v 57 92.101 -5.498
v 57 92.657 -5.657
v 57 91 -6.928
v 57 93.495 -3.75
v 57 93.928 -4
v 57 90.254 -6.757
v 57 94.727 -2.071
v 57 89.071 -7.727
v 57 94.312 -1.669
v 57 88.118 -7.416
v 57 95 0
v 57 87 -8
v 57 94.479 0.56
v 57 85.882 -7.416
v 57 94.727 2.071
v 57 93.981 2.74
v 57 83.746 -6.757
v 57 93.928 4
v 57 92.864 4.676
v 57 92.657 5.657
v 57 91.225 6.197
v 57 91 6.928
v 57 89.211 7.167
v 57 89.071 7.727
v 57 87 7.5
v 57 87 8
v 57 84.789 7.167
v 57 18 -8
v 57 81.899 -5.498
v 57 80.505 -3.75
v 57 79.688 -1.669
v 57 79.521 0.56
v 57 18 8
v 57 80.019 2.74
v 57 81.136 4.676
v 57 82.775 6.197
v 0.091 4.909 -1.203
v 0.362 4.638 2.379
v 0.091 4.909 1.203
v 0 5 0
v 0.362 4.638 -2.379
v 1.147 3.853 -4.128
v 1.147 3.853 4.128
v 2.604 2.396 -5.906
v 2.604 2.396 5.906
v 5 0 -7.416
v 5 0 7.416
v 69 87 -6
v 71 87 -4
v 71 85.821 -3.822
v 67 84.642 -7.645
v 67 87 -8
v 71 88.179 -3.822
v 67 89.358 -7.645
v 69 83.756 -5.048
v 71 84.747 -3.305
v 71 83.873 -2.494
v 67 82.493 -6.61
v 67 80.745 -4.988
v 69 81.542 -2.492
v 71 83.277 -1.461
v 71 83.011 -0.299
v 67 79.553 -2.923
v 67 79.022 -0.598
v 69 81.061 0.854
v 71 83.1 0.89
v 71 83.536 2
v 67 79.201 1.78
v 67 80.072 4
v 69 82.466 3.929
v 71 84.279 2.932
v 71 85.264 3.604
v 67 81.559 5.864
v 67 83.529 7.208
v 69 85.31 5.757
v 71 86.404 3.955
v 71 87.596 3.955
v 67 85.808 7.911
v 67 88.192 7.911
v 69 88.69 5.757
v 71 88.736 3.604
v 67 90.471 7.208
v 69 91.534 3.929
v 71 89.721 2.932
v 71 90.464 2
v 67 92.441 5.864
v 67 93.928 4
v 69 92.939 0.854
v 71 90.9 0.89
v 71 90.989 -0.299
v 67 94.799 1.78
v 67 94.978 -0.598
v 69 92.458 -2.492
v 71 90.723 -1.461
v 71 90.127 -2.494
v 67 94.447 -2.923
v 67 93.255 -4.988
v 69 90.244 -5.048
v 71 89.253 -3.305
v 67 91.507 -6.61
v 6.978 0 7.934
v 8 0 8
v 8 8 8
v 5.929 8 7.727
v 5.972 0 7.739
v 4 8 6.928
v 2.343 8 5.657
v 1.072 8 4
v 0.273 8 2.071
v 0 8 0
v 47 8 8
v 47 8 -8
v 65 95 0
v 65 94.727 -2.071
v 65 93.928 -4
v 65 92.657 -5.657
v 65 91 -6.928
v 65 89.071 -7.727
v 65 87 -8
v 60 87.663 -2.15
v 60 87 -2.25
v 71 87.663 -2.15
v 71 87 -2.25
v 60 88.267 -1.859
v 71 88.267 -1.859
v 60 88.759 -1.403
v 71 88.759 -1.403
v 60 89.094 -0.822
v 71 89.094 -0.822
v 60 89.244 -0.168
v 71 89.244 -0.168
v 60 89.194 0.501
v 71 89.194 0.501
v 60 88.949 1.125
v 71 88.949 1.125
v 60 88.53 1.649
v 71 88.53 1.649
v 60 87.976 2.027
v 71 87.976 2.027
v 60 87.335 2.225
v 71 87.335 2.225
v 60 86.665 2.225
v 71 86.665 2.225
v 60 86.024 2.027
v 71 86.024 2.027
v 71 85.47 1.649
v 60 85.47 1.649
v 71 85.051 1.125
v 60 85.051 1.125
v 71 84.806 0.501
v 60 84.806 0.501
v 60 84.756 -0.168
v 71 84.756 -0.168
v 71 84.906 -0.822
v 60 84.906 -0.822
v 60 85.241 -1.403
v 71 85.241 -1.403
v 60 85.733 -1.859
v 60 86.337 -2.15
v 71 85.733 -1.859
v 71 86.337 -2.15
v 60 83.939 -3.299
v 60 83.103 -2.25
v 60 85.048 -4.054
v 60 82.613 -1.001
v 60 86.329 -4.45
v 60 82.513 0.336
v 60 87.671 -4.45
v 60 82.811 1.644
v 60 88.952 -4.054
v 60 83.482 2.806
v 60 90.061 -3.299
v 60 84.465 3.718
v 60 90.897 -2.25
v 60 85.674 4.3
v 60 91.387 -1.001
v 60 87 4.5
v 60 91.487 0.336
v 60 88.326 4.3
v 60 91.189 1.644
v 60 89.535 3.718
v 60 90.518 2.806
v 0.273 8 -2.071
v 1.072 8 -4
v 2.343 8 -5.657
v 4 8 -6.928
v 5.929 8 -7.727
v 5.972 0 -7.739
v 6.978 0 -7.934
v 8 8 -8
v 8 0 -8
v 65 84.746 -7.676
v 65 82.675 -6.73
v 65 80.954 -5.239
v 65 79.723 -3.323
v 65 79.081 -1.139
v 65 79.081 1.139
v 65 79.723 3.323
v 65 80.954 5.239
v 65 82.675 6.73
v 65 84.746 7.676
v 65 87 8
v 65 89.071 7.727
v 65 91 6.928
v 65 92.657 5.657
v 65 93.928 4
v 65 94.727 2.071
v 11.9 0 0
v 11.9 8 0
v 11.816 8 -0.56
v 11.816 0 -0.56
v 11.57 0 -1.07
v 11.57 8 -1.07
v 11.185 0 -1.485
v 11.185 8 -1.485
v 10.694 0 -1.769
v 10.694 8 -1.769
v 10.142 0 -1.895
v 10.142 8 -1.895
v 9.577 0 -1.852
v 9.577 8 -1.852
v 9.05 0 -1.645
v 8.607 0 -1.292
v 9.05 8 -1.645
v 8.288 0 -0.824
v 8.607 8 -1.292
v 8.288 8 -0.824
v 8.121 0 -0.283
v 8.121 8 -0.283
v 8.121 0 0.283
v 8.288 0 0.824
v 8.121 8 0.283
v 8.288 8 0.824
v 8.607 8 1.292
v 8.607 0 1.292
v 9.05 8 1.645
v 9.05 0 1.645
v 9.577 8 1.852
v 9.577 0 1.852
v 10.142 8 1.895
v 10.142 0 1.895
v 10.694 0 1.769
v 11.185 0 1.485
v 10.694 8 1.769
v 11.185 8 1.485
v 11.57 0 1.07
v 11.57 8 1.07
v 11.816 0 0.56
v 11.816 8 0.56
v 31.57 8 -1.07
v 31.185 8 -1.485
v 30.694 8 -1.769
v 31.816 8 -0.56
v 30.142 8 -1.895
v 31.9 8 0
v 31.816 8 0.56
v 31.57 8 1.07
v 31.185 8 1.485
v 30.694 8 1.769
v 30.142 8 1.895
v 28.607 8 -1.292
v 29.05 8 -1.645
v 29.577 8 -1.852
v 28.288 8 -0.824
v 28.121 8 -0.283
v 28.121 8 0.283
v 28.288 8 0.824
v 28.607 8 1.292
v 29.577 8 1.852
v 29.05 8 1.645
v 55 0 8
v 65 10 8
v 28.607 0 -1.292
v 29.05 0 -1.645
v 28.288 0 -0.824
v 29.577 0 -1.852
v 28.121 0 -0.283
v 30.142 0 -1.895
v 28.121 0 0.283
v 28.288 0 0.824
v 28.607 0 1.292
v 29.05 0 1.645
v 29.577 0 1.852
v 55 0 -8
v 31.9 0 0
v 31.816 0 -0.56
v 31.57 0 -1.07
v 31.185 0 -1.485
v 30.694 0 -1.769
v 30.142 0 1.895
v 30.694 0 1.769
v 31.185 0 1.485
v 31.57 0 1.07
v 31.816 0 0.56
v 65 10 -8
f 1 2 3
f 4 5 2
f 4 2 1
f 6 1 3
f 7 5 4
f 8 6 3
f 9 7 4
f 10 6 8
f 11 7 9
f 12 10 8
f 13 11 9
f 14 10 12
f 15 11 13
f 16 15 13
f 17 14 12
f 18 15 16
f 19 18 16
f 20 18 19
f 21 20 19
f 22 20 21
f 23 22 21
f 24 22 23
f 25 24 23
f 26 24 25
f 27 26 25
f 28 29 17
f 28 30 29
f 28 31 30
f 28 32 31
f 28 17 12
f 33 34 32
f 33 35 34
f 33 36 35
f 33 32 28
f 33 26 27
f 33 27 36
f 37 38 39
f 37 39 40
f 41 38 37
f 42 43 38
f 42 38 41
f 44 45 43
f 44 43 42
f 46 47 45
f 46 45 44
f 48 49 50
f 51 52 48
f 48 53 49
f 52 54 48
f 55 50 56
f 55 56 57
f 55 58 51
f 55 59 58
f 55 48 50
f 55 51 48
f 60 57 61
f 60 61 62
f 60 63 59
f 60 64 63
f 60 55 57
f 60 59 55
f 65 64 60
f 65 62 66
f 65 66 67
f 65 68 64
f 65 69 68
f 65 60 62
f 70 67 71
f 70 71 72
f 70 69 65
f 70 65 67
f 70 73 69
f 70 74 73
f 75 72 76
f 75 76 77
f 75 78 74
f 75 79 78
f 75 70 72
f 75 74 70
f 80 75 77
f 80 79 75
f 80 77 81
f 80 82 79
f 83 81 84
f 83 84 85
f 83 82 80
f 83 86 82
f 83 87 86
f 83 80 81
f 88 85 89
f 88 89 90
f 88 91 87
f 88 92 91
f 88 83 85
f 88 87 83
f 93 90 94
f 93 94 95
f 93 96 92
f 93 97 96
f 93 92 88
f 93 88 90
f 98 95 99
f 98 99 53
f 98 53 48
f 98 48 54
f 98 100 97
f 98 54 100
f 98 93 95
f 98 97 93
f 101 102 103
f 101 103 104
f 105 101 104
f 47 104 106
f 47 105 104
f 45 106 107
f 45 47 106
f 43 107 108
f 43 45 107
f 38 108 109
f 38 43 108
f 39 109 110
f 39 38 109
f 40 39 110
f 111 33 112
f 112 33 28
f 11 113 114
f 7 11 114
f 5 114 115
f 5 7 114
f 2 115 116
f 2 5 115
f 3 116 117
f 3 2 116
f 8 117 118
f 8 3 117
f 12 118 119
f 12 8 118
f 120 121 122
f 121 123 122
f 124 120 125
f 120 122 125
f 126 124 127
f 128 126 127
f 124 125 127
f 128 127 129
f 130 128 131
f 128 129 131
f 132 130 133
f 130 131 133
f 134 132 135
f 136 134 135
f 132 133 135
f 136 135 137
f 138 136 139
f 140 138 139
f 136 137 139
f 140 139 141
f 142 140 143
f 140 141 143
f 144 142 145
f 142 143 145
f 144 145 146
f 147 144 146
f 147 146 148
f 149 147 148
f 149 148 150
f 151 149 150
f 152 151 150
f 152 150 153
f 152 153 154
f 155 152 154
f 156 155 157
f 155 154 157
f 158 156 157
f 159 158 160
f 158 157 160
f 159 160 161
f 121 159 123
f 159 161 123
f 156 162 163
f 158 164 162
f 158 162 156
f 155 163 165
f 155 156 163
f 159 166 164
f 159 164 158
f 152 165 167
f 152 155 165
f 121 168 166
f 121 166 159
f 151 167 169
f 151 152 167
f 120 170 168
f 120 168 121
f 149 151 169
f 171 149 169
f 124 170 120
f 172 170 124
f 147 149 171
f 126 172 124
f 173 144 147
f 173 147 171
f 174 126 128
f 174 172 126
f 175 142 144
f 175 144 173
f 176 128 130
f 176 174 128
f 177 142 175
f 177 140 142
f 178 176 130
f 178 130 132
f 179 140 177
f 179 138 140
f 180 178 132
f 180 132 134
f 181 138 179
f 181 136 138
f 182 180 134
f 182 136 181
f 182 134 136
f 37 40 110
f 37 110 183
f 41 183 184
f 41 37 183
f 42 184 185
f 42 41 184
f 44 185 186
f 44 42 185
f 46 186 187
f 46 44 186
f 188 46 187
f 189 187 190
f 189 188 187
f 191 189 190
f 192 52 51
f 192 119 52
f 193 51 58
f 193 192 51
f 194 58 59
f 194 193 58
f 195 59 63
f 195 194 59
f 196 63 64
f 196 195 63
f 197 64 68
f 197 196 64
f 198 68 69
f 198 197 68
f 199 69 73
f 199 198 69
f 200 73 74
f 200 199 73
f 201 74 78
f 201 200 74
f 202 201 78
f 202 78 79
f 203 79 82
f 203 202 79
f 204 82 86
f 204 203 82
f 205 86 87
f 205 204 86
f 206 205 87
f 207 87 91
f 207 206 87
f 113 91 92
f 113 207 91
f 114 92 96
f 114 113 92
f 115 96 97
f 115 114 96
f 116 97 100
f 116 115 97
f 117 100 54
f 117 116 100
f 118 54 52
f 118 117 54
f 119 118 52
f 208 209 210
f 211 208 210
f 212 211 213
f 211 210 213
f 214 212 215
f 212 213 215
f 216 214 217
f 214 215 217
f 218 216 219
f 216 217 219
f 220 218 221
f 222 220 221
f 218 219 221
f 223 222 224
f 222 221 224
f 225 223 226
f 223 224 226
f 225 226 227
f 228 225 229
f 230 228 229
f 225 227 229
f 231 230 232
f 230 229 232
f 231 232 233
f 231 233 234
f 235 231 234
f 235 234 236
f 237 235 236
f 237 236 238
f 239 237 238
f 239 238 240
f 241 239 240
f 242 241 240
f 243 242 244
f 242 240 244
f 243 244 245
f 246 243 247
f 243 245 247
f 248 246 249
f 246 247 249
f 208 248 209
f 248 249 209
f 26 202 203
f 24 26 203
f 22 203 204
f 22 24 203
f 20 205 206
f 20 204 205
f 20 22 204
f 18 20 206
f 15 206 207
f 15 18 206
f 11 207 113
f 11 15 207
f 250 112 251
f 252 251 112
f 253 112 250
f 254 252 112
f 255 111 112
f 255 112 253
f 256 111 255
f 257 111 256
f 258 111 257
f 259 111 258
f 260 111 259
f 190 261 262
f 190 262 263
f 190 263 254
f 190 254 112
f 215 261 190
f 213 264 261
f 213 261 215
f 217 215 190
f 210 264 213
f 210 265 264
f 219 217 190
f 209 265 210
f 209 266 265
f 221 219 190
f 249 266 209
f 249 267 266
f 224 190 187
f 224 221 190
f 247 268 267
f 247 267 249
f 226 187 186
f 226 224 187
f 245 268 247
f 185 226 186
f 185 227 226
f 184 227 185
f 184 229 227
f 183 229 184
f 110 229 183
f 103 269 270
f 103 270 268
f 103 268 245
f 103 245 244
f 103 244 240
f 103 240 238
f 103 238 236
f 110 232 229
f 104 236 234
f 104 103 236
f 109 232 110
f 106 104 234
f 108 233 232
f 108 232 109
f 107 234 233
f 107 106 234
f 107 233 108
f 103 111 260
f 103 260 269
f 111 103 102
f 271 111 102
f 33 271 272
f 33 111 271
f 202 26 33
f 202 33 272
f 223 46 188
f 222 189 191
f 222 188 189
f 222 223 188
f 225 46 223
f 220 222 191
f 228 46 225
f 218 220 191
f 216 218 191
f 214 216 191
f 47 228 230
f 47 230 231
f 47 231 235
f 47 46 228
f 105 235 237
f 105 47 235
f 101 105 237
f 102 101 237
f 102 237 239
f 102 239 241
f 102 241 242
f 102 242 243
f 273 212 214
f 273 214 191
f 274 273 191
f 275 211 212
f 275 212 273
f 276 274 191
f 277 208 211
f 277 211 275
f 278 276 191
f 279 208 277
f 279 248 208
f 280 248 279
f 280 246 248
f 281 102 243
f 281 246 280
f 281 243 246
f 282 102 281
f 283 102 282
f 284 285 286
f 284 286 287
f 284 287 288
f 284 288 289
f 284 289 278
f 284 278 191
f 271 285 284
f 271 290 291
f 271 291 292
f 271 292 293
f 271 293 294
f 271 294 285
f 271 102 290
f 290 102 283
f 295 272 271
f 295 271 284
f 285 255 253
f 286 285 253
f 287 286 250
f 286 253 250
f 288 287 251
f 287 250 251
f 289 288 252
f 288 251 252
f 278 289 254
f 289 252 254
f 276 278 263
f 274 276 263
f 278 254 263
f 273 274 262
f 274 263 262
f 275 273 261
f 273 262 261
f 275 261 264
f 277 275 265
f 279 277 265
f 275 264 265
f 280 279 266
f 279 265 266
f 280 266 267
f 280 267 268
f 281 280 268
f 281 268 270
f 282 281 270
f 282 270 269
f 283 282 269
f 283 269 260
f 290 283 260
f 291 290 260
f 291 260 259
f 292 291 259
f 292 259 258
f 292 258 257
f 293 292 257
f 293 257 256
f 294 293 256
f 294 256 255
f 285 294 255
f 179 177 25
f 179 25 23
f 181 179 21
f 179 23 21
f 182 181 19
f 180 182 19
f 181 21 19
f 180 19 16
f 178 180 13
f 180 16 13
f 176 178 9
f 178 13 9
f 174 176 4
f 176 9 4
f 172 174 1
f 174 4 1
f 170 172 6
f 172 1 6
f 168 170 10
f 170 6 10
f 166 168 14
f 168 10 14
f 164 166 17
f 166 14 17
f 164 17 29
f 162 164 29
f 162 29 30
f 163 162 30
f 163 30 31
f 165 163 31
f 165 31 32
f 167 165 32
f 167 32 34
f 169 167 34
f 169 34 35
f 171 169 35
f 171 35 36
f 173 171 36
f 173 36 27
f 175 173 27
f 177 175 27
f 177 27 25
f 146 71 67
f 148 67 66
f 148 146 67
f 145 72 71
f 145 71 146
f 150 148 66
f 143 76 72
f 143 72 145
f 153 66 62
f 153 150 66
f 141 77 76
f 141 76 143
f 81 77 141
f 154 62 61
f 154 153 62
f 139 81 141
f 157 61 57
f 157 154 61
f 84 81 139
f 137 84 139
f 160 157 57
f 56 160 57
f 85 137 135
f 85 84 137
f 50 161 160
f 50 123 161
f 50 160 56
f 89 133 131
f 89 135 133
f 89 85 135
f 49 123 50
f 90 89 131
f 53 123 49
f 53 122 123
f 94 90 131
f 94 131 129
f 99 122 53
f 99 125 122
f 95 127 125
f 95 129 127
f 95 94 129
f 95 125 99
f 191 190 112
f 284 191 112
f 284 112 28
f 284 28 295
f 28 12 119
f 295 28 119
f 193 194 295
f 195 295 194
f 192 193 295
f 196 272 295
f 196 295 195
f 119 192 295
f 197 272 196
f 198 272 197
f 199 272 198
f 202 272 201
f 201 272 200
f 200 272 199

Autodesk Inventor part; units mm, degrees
ref_plane "YZ Plane" through (0, 0, 0) normal (1, 0, 0) x (0, 1, 0)
ref_plane "XZ Plane" through (0, 0, 0) normal (0, 1, 0) x (-1, 0, 0)
ref_plane "XY Plane" through (0, 0, 0) normal (0, 0, 1) x (1, 0, 0)
sketch "Sketch3" plane through (0, 0, 0) normal (0, 0, 1) x (1, 0, 0)
  line L0 (0, 0) -> (65, 0)
  line L1 (65, 0) -> (65, 95)
  line L2 (65, 95) -> (57, 95)
  line L3 (57, 95) -> (57, 8)
  line L4 (57, 8) -> (0, 8)
  line L5 (0, 8) -> (0, 0)
  dimension "d17" = 8
  dimension "d18" = 57
  dimension "d19" = 87
  dimension "d20" = 8
extrude "Extrusion3" add sketch "Sketch3" against normal mid plane 16
sketch "Sketch5" plane through (0, 8, -8) normal (0, 1, 0) x (1, 0, 0)
  line L0 (-13, -8) -> (78, -8) projected
  circle A0 centre (10, -8) radius 1.9
  circle A1 centre (30, -8) radius 1.9
  line L1 (0, 0) -> (0, -16) projected
  point P0 (0, -8)
  dimension "d23" = 3.8
  dimension "d24" = 3.8
  dimension "d25" = 10
  dimension "d26" = 20
extrude "Extrusion4" cut sketch "Sketch5" against normal through all
chamfer "Chamfer2" distance 5 angle 45 1 edges at (0, 0, 0)
chamfer "Chamfer3" distance 10 angle 45 1 edges at (57, 8, 0)
chamfer "Chamfer4" distance 10 angle 45 1 edges at (65, 0, 0)
sketch "Sketch6" plane through (65, 95, 8) normal (1, 0, 0) x (0, 0, -1)
  line L0 (16, -77) -> (16, 0) projected
  line L1 (0, -85) -> (0, 0) projected
  circle A0 centre (8, -8) radius 8
  line L2 (16, 0) -> (0, 0) projected
  point P0 (8, -95)
  dimension "d39" = 16
extrude "Extrusion5" add sketch "Sketch6" along normal blind 7 contours A0
fillet "Fillet1" radius 8 2 edges at (61, 95, -8) (61, 95, 8)
sketch "Sketch7" plane through (57, 18, -8) normal (-1, 0, 0) x (0, 0, 1)
  point P0 (8, -18)
sketch "Sketch8" plane through (72, 87, 0) normal (1, 0, 0) x (0, 0, -1)
  circle A0 centre (0, 0) radius 8 projected
  circle A1 centre (0, 0) radius 2.75
  point P0 (0, -87)
  dimension "d43" = 5.5
extrude "Extrusion6" add sketch "Sketch8" along normal blind 4 contours A1
sketch "Sketch9" plane through (76, 87, 0) normal (1, 0, 0) x (0, 0, -1)
  circle A0 centre (0, 0) radius 2.75 construction
  circle A1 centre (0, 0) radius 2.25
  point P0 (0, -87)
  dimension "d46" = 4.5
extrude "Extrusion7" cut sketch "Sketch9" against normal through all
sketch "Sketch10" plane through (57, 18, -8) normal (-1, 0, 0) x (0, 0, 1)
  circle A0 centre (8, 69) radius 2.25 projected
  circle A1 centre (8, 69) radius 4.5
  point P0 (8, -18)
  dimension "d49" = 9
extrude "Extrusion8" cut sketch "Sketch10" against normal blind 3
chamfer "Chamfer5" distance 3 angle 45 1 edges at (57, 87, -4.5)
chamfer "Chamfer6" distance 3 angle 45 1 edges at (72, 87, 2.75)
fillet "Fillet2" radius 8 2 edges at (0, 6.5, -8) (0, 6.5, 8)
sketch "Sketch11" plane through (76, 87, 0) normal (1, 0, 0) x (0, 0, -1)
  circle A0 centre (0, 0) radius 2.25 projected
  circle A1 centre (0, 0) radius 2.75 projected
  circle A2 centre (0, 0) radius 10.0452
  point P0 (0, -87)
extrude "Extrusion9" cut sketch "Sketch11" against normal blind 5 contours A0 | A1 | A2
chamfer "Chamfer7" distance 4 angle 45 1 edges at (71, 87, 8)
equation "\"d20\" = d17"
properties part number "_3DPrint"
